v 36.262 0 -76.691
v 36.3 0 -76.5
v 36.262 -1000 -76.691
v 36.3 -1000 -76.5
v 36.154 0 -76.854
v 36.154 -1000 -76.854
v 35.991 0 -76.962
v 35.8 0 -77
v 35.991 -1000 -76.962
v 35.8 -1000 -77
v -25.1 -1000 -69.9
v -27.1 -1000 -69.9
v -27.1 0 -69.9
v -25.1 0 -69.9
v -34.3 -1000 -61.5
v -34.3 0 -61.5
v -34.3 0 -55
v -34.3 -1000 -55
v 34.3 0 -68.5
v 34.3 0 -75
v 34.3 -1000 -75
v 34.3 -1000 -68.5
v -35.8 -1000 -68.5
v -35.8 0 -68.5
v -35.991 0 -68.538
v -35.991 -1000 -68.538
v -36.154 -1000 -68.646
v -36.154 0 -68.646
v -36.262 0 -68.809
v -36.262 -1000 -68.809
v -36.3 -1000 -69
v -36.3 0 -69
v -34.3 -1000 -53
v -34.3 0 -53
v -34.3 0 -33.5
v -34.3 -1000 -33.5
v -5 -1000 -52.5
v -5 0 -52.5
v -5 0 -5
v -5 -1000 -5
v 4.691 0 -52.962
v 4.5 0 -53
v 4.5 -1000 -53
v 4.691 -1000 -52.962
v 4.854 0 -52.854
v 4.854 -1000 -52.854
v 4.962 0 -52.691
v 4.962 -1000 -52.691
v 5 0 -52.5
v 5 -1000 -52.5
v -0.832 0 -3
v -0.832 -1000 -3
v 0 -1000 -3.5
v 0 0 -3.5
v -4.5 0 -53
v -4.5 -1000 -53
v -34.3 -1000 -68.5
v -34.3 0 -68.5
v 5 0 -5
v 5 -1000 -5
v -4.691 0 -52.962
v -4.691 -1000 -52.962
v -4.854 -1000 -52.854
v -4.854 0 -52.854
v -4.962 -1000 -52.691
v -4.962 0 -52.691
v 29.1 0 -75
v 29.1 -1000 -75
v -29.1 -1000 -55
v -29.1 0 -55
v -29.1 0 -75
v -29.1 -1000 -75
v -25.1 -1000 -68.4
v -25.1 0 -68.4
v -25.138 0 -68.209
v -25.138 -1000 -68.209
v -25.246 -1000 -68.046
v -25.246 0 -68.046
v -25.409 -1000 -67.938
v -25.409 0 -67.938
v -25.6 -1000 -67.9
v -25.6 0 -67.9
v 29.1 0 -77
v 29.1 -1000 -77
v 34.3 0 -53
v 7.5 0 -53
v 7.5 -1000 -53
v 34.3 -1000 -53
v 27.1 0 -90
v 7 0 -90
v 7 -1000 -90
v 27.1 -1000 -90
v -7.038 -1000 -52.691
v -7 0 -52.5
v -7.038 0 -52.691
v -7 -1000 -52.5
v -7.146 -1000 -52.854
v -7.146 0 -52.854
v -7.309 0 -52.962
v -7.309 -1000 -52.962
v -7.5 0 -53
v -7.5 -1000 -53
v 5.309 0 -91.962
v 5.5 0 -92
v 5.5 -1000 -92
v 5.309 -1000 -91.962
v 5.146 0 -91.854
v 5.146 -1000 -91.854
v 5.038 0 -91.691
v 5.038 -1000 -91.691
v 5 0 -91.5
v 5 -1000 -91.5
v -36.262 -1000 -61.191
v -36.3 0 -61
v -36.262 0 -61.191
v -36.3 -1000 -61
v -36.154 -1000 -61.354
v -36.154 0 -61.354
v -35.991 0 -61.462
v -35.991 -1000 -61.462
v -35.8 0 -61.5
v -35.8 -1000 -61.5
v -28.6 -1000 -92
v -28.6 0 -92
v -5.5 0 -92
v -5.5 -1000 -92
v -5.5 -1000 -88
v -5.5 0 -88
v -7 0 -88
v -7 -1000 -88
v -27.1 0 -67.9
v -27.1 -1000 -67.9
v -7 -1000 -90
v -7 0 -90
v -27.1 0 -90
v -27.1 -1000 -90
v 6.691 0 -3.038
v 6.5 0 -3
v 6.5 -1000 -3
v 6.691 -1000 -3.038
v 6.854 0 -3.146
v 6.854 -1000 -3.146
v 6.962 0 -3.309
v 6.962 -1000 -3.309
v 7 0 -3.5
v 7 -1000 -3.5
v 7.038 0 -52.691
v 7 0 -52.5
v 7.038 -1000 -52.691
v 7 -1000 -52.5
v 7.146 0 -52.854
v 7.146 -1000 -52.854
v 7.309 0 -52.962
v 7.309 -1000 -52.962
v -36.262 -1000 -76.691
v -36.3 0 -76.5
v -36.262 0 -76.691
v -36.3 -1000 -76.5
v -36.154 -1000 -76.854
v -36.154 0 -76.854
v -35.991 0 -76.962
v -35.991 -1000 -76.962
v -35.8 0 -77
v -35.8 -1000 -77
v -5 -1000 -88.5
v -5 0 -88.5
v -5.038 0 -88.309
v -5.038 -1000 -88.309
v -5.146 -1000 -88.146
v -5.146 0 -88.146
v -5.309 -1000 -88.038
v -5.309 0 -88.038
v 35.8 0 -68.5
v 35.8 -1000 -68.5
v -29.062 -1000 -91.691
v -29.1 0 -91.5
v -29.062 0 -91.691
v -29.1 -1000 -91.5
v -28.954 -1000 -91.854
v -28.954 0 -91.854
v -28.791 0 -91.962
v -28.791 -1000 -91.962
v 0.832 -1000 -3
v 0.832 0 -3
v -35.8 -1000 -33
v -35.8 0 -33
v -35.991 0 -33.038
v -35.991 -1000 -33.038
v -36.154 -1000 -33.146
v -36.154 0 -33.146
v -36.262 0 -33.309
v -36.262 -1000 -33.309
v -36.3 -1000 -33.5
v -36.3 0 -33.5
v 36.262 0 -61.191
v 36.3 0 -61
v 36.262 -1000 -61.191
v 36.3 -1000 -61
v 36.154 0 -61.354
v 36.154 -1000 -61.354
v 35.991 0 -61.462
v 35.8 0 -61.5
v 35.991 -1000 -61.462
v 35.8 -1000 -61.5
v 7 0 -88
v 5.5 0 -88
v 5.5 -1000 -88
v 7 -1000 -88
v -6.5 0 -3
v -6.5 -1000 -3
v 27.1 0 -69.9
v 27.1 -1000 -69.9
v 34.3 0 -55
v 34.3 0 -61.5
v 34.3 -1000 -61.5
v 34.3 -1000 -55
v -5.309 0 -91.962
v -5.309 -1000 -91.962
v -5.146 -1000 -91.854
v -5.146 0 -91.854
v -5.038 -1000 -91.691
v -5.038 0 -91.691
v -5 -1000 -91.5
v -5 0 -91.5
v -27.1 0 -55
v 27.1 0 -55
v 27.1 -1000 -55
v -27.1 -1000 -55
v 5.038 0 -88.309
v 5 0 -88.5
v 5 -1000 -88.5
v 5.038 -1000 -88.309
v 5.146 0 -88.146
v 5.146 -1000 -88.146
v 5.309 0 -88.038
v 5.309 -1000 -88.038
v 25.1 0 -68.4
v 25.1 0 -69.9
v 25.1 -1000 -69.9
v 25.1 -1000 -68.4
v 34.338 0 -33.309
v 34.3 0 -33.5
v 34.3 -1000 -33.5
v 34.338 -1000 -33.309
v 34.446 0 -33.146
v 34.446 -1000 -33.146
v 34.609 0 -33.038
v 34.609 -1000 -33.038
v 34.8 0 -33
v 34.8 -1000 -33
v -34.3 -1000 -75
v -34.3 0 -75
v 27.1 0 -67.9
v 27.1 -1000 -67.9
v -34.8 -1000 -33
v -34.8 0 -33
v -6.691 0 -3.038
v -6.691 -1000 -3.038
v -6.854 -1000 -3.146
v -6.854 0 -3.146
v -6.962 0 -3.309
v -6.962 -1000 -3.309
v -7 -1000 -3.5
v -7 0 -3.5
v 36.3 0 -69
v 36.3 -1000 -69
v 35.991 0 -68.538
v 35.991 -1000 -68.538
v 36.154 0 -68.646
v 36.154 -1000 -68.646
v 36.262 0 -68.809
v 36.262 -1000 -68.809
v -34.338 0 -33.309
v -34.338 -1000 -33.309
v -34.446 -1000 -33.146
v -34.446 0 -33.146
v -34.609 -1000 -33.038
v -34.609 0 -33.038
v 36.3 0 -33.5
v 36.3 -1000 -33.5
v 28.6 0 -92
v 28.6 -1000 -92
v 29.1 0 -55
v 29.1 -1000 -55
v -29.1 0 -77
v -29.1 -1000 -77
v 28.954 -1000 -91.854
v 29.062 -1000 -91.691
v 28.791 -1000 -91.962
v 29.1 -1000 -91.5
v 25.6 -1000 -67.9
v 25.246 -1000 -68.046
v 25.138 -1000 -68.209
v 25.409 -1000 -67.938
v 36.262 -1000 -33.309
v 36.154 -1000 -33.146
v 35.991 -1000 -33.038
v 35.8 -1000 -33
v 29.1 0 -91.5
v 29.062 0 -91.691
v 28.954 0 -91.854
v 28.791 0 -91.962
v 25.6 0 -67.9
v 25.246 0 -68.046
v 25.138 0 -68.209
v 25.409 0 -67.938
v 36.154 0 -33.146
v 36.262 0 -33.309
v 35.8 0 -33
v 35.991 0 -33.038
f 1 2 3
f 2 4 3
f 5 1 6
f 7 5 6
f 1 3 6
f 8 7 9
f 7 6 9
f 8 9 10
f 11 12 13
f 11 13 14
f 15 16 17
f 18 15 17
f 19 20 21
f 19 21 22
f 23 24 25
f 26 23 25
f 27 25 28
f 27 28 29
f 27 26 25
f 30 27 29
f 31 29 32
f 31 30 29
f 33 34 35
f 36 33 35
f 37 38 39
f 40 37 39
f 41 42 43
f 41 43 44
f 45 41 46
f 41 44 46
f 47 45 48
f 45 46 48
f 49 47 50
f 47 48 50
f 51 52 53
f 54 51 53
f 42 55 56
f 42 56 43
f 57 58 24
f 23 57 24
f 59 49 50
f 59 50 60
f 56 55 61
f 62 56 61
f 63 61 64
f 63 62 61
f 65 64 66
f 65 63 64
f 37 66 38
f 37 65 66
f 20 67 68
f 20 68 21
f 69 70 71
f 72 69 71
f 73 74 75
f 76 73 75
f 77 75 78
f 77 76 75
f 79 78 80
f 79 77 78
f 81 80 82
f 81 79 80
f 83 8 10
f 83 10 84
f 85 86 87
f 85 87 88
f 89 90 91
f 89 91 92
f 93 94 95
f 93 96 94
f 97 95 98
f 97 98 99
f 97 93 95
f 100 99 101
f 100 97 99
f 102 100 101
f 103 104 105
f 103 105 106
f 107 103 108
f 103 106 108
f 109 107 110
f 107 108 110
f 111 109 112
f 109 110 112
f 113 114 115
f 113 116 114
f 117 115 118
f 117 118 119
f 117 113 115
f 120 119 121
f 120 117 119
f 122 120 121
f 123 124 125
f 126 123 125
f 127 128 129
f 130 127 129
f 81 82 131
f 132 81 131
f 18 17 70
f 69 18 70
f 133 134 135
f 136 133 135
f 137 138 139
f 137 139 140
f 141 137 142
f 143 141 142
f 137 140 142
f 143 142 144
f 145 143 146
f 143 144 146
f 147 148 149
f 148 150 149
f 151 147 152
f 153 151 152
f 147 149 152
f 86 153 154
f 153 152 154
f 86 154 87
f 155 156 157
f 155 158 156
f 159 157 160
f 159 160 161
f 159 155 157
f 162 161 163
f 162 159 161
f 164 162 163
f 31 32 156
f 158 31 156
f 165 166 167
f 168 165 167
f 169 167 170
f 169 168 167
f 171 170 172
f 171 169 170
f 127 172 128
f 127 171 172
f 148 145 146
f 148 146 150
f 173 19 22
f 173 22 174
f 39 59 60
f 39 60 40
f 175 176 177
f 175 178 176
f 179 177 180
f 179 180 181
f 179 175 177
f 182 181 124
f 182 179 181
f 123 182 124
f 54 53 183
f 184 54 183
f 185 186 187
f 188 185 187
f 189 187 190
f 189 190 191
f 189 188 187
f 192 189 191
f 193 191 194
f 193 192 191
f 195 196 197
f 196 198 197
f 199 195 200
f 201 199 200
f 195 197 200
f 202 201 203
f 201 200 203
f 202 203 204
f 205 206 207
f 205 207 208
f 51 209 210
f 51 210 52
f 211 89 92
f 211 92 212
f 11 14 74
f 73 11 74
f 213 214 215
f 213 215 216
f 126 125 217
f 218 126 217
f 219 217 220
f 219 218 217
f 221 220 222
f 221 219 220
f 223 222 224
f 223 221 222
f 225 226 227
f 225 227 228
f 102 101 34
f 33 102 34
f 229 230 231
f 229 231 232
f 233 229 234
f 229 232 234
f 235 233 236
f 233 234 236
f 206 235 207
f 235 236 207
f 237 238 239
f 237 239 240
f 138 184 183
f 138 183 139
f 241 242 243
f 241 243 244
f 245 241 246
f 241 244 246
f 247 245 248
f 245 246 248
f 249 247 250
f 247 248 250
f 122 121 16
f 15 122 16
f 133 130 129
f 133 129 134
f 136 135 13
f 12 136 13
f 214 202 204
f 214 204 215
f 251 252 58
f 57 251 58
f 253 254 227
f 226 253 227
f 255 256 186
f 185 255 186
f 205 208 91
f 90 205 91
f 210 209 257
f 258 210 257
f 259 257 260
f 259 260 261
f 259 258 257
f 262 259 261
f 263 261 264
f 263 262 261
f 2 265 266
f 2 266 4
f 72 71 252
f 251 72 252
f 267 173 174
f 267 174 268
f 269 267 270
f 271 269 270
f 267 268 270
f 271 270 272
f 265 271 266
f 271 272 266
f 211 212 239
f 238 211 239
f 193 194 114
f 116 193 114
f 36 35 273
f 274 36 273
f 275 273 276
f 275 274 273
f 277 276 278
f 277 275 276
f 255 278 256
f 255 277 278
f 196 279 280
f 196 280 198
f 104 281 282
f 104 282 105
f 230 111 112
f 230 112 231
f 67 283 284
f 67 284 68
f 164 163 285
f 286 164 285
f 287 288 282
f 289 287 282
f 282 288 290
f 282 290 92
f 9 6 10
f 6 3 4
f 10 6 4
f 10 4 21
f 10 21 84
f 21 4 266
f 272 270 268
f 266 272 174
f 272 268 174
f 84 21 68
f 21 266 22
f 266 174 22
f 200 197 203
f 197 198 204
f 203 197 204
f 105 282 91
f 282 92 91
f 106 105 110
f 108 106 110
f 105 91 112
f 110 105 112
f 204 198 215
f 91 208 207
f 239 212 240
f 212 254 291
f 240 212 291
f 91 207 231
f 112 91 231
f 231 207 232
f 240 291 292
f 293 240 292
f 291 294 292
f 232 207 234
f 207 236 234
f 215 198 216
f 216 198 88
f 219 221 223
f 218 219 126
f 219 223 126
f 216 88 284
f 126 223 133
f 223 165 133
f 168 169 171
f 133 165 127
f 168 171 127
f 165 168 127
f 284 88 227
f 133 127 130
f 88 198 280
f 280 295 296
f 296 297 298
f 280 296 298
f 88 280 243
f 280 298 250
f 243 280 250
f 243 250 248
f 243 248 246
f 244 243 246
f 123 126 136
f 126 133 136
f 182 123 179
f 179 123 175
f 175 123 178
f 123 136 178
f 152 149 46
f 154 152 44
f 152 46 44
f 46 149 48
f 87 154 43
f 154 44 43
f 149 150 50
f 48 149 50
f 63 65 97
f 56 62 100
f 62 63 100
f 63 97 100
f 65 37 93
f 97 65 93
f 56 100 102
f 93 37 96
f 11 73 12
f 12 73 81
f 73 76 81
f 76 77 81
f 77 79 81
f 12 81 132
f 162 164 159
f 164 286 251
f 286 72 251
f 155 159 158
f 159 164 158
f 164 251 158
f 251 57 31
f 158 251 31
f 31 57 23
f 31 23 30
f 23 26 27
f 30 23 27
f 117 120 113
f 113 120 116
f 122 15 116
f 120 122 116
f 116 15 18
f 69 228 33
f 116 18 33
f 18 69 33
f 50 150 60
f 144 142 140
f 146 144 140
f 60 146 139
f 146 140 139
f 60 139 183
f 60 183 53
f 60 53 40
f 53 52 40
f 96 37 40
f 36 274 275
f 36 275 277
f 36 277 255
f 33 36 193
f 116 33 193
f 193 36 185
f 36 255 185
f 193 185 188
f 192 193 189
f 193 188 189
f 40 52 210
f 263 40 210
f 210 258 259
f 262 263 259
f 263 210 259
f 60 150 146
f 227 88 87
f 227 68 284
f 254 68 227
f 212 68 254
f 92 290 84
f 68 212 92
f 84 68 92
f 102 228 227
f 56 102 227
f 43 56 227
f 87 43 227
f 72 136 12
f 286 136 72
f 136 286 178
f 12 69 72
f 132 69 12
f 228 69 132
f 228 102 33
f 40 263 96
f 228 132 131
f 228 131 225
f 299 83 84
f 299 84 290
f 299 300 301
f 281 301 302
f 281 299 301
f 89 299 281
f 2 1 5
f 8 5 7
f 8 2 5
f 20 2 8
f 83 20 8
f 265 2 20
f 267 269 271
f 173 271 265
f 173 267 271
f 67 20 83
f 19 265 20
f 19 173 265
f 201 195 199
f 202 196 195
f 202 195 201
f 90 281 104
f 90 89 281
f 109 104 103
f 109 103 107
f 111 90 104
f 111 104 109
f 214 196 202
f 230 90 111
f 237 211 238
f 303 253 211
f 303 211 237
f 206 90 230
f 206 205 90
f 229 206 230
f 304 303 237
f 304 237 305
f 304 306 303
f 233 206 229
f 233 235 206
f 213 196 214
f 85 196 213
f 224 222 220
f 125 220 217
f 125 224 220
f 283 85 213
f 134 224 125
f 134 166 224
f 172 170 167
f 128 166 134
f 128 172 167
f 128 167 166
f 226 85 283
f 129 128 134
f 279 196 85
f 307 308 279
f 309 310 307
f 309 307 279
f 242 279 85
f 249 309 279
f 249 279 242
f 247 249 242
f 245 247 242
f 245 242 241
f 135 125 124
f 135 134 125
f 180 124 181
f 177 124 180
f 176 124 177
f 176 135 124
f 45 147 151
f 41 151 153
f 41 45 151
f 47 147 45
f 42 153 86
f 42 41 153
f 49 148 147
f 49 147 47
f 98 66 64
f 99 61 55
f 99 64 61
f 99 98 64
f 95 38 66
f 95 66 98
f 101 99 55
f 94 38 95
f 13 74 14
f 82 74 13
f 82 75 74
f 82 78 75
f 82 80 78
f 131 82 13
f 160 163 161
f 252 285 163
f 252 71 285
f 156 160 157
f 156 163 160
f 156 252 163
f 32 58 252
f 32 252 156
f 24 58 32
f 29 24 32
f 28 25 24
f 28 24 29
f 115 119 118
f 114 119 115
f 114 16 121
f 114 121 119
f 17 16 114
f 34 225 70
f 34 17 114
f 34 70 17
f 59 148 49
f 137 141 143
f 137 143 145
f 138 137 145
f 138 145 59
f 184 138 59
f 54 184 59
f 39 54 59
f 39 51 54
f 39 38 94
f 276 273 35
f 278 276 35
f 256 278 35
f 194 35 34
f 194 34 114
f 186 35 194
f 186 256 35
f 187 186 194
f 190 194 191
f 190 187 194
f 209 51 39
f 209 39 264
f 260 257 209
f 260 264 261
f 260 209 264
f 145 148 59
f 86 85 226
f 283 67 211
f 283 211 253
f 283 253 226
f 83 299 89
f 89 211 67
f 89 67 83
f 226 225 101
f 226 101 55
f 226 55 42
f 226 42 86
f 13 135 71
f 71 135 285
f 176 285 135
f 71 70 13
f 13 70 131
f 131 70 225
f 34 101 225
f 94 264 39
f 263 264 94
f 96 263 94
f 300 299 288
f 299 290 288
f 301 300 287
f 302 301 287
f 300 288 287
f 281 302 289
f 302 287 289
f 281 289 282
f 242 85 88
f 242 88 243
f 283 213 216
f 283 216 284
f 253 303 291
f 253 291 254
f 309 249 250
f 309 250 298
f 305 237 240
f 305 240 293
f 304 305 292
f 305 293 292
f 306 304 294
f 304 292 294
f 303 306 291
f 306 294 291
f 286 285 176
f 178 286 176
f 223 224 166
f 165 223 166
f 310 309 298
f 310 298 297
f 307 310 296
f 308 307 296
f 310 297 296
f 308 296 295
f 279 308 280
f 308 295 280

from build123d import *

# Parameters (mm, degrees)
F1_DEPTH = 1000
F2_R     = 0.5
F5_DEPTH = 1000


with BuildPart() as f1:
    # F0 (on Front) → F1 (new body)
    with BuildSketch(Plane.XZ):
        Polygon((0, -5), (0, -3), (-7, -3), (-7, -53), (-34.3, -53), (-34.3, -33), (-36.3, -33), (-36.3, -61.5), (-34.3, -61.5), (-34.3, -55), (-29.1, -55), (-29.1, -75), (-34.3, -75), (-34.3, -68.5), (-36.3, -68.5), (-36.3, -77), (-29.1, -77), (-29.1, -92), (-5, -92), (-5, -88), (-7, -88), (-7, -90), (-27.1, -90), (-27.1, -69.9), (-25.1, -69.9), (-25.1, -67.9), (-27.1, -67.9), (-27.1, -55), (0, -55), (0, -53), (-5, -53), (-5, -5), align=None)
    extrude(amount=F1_DEPTH)

    # F2
    f2_edges = [f1.edges().sort_by_distance(p)[0] for p in [
        (-36.3, -500, -33),
        (-36.3, -500, -68.5),
        (-5, -500, -92),
        (-5, -500, -88),
        (-7, -500, -3),
        (-34.3, -500, -33),
        (-5, -500, -53),
        (-25.1, -500, -67.9),
        (-29.1, -500, -92),
        (-36.3, -500, -77),
        (-36.3, -500, -61.5),
        (-7, -500, -53),
    ]]
    fillet(f2_edges, radius=F2_R)

    # F3: F1 across plane


with BuildPart() as f1_1:
    add(f1.part)
    add(f1.part.mirror(Plane.YZ))

    # F4 (on face) → F5 (cut)
    with BuildSketch(Plane.XZ.offset(1000)):
        Polygon((0, -3.5), (0, -3), (-0.83214, -3), align=None)
        Polygon((0.83214, -3), (0, -3), (0, -3.5), align=None)
    extrude(amount=-F5_DEPTH, mode=Mode.SUBTRACT)


solid = f1_1.part
